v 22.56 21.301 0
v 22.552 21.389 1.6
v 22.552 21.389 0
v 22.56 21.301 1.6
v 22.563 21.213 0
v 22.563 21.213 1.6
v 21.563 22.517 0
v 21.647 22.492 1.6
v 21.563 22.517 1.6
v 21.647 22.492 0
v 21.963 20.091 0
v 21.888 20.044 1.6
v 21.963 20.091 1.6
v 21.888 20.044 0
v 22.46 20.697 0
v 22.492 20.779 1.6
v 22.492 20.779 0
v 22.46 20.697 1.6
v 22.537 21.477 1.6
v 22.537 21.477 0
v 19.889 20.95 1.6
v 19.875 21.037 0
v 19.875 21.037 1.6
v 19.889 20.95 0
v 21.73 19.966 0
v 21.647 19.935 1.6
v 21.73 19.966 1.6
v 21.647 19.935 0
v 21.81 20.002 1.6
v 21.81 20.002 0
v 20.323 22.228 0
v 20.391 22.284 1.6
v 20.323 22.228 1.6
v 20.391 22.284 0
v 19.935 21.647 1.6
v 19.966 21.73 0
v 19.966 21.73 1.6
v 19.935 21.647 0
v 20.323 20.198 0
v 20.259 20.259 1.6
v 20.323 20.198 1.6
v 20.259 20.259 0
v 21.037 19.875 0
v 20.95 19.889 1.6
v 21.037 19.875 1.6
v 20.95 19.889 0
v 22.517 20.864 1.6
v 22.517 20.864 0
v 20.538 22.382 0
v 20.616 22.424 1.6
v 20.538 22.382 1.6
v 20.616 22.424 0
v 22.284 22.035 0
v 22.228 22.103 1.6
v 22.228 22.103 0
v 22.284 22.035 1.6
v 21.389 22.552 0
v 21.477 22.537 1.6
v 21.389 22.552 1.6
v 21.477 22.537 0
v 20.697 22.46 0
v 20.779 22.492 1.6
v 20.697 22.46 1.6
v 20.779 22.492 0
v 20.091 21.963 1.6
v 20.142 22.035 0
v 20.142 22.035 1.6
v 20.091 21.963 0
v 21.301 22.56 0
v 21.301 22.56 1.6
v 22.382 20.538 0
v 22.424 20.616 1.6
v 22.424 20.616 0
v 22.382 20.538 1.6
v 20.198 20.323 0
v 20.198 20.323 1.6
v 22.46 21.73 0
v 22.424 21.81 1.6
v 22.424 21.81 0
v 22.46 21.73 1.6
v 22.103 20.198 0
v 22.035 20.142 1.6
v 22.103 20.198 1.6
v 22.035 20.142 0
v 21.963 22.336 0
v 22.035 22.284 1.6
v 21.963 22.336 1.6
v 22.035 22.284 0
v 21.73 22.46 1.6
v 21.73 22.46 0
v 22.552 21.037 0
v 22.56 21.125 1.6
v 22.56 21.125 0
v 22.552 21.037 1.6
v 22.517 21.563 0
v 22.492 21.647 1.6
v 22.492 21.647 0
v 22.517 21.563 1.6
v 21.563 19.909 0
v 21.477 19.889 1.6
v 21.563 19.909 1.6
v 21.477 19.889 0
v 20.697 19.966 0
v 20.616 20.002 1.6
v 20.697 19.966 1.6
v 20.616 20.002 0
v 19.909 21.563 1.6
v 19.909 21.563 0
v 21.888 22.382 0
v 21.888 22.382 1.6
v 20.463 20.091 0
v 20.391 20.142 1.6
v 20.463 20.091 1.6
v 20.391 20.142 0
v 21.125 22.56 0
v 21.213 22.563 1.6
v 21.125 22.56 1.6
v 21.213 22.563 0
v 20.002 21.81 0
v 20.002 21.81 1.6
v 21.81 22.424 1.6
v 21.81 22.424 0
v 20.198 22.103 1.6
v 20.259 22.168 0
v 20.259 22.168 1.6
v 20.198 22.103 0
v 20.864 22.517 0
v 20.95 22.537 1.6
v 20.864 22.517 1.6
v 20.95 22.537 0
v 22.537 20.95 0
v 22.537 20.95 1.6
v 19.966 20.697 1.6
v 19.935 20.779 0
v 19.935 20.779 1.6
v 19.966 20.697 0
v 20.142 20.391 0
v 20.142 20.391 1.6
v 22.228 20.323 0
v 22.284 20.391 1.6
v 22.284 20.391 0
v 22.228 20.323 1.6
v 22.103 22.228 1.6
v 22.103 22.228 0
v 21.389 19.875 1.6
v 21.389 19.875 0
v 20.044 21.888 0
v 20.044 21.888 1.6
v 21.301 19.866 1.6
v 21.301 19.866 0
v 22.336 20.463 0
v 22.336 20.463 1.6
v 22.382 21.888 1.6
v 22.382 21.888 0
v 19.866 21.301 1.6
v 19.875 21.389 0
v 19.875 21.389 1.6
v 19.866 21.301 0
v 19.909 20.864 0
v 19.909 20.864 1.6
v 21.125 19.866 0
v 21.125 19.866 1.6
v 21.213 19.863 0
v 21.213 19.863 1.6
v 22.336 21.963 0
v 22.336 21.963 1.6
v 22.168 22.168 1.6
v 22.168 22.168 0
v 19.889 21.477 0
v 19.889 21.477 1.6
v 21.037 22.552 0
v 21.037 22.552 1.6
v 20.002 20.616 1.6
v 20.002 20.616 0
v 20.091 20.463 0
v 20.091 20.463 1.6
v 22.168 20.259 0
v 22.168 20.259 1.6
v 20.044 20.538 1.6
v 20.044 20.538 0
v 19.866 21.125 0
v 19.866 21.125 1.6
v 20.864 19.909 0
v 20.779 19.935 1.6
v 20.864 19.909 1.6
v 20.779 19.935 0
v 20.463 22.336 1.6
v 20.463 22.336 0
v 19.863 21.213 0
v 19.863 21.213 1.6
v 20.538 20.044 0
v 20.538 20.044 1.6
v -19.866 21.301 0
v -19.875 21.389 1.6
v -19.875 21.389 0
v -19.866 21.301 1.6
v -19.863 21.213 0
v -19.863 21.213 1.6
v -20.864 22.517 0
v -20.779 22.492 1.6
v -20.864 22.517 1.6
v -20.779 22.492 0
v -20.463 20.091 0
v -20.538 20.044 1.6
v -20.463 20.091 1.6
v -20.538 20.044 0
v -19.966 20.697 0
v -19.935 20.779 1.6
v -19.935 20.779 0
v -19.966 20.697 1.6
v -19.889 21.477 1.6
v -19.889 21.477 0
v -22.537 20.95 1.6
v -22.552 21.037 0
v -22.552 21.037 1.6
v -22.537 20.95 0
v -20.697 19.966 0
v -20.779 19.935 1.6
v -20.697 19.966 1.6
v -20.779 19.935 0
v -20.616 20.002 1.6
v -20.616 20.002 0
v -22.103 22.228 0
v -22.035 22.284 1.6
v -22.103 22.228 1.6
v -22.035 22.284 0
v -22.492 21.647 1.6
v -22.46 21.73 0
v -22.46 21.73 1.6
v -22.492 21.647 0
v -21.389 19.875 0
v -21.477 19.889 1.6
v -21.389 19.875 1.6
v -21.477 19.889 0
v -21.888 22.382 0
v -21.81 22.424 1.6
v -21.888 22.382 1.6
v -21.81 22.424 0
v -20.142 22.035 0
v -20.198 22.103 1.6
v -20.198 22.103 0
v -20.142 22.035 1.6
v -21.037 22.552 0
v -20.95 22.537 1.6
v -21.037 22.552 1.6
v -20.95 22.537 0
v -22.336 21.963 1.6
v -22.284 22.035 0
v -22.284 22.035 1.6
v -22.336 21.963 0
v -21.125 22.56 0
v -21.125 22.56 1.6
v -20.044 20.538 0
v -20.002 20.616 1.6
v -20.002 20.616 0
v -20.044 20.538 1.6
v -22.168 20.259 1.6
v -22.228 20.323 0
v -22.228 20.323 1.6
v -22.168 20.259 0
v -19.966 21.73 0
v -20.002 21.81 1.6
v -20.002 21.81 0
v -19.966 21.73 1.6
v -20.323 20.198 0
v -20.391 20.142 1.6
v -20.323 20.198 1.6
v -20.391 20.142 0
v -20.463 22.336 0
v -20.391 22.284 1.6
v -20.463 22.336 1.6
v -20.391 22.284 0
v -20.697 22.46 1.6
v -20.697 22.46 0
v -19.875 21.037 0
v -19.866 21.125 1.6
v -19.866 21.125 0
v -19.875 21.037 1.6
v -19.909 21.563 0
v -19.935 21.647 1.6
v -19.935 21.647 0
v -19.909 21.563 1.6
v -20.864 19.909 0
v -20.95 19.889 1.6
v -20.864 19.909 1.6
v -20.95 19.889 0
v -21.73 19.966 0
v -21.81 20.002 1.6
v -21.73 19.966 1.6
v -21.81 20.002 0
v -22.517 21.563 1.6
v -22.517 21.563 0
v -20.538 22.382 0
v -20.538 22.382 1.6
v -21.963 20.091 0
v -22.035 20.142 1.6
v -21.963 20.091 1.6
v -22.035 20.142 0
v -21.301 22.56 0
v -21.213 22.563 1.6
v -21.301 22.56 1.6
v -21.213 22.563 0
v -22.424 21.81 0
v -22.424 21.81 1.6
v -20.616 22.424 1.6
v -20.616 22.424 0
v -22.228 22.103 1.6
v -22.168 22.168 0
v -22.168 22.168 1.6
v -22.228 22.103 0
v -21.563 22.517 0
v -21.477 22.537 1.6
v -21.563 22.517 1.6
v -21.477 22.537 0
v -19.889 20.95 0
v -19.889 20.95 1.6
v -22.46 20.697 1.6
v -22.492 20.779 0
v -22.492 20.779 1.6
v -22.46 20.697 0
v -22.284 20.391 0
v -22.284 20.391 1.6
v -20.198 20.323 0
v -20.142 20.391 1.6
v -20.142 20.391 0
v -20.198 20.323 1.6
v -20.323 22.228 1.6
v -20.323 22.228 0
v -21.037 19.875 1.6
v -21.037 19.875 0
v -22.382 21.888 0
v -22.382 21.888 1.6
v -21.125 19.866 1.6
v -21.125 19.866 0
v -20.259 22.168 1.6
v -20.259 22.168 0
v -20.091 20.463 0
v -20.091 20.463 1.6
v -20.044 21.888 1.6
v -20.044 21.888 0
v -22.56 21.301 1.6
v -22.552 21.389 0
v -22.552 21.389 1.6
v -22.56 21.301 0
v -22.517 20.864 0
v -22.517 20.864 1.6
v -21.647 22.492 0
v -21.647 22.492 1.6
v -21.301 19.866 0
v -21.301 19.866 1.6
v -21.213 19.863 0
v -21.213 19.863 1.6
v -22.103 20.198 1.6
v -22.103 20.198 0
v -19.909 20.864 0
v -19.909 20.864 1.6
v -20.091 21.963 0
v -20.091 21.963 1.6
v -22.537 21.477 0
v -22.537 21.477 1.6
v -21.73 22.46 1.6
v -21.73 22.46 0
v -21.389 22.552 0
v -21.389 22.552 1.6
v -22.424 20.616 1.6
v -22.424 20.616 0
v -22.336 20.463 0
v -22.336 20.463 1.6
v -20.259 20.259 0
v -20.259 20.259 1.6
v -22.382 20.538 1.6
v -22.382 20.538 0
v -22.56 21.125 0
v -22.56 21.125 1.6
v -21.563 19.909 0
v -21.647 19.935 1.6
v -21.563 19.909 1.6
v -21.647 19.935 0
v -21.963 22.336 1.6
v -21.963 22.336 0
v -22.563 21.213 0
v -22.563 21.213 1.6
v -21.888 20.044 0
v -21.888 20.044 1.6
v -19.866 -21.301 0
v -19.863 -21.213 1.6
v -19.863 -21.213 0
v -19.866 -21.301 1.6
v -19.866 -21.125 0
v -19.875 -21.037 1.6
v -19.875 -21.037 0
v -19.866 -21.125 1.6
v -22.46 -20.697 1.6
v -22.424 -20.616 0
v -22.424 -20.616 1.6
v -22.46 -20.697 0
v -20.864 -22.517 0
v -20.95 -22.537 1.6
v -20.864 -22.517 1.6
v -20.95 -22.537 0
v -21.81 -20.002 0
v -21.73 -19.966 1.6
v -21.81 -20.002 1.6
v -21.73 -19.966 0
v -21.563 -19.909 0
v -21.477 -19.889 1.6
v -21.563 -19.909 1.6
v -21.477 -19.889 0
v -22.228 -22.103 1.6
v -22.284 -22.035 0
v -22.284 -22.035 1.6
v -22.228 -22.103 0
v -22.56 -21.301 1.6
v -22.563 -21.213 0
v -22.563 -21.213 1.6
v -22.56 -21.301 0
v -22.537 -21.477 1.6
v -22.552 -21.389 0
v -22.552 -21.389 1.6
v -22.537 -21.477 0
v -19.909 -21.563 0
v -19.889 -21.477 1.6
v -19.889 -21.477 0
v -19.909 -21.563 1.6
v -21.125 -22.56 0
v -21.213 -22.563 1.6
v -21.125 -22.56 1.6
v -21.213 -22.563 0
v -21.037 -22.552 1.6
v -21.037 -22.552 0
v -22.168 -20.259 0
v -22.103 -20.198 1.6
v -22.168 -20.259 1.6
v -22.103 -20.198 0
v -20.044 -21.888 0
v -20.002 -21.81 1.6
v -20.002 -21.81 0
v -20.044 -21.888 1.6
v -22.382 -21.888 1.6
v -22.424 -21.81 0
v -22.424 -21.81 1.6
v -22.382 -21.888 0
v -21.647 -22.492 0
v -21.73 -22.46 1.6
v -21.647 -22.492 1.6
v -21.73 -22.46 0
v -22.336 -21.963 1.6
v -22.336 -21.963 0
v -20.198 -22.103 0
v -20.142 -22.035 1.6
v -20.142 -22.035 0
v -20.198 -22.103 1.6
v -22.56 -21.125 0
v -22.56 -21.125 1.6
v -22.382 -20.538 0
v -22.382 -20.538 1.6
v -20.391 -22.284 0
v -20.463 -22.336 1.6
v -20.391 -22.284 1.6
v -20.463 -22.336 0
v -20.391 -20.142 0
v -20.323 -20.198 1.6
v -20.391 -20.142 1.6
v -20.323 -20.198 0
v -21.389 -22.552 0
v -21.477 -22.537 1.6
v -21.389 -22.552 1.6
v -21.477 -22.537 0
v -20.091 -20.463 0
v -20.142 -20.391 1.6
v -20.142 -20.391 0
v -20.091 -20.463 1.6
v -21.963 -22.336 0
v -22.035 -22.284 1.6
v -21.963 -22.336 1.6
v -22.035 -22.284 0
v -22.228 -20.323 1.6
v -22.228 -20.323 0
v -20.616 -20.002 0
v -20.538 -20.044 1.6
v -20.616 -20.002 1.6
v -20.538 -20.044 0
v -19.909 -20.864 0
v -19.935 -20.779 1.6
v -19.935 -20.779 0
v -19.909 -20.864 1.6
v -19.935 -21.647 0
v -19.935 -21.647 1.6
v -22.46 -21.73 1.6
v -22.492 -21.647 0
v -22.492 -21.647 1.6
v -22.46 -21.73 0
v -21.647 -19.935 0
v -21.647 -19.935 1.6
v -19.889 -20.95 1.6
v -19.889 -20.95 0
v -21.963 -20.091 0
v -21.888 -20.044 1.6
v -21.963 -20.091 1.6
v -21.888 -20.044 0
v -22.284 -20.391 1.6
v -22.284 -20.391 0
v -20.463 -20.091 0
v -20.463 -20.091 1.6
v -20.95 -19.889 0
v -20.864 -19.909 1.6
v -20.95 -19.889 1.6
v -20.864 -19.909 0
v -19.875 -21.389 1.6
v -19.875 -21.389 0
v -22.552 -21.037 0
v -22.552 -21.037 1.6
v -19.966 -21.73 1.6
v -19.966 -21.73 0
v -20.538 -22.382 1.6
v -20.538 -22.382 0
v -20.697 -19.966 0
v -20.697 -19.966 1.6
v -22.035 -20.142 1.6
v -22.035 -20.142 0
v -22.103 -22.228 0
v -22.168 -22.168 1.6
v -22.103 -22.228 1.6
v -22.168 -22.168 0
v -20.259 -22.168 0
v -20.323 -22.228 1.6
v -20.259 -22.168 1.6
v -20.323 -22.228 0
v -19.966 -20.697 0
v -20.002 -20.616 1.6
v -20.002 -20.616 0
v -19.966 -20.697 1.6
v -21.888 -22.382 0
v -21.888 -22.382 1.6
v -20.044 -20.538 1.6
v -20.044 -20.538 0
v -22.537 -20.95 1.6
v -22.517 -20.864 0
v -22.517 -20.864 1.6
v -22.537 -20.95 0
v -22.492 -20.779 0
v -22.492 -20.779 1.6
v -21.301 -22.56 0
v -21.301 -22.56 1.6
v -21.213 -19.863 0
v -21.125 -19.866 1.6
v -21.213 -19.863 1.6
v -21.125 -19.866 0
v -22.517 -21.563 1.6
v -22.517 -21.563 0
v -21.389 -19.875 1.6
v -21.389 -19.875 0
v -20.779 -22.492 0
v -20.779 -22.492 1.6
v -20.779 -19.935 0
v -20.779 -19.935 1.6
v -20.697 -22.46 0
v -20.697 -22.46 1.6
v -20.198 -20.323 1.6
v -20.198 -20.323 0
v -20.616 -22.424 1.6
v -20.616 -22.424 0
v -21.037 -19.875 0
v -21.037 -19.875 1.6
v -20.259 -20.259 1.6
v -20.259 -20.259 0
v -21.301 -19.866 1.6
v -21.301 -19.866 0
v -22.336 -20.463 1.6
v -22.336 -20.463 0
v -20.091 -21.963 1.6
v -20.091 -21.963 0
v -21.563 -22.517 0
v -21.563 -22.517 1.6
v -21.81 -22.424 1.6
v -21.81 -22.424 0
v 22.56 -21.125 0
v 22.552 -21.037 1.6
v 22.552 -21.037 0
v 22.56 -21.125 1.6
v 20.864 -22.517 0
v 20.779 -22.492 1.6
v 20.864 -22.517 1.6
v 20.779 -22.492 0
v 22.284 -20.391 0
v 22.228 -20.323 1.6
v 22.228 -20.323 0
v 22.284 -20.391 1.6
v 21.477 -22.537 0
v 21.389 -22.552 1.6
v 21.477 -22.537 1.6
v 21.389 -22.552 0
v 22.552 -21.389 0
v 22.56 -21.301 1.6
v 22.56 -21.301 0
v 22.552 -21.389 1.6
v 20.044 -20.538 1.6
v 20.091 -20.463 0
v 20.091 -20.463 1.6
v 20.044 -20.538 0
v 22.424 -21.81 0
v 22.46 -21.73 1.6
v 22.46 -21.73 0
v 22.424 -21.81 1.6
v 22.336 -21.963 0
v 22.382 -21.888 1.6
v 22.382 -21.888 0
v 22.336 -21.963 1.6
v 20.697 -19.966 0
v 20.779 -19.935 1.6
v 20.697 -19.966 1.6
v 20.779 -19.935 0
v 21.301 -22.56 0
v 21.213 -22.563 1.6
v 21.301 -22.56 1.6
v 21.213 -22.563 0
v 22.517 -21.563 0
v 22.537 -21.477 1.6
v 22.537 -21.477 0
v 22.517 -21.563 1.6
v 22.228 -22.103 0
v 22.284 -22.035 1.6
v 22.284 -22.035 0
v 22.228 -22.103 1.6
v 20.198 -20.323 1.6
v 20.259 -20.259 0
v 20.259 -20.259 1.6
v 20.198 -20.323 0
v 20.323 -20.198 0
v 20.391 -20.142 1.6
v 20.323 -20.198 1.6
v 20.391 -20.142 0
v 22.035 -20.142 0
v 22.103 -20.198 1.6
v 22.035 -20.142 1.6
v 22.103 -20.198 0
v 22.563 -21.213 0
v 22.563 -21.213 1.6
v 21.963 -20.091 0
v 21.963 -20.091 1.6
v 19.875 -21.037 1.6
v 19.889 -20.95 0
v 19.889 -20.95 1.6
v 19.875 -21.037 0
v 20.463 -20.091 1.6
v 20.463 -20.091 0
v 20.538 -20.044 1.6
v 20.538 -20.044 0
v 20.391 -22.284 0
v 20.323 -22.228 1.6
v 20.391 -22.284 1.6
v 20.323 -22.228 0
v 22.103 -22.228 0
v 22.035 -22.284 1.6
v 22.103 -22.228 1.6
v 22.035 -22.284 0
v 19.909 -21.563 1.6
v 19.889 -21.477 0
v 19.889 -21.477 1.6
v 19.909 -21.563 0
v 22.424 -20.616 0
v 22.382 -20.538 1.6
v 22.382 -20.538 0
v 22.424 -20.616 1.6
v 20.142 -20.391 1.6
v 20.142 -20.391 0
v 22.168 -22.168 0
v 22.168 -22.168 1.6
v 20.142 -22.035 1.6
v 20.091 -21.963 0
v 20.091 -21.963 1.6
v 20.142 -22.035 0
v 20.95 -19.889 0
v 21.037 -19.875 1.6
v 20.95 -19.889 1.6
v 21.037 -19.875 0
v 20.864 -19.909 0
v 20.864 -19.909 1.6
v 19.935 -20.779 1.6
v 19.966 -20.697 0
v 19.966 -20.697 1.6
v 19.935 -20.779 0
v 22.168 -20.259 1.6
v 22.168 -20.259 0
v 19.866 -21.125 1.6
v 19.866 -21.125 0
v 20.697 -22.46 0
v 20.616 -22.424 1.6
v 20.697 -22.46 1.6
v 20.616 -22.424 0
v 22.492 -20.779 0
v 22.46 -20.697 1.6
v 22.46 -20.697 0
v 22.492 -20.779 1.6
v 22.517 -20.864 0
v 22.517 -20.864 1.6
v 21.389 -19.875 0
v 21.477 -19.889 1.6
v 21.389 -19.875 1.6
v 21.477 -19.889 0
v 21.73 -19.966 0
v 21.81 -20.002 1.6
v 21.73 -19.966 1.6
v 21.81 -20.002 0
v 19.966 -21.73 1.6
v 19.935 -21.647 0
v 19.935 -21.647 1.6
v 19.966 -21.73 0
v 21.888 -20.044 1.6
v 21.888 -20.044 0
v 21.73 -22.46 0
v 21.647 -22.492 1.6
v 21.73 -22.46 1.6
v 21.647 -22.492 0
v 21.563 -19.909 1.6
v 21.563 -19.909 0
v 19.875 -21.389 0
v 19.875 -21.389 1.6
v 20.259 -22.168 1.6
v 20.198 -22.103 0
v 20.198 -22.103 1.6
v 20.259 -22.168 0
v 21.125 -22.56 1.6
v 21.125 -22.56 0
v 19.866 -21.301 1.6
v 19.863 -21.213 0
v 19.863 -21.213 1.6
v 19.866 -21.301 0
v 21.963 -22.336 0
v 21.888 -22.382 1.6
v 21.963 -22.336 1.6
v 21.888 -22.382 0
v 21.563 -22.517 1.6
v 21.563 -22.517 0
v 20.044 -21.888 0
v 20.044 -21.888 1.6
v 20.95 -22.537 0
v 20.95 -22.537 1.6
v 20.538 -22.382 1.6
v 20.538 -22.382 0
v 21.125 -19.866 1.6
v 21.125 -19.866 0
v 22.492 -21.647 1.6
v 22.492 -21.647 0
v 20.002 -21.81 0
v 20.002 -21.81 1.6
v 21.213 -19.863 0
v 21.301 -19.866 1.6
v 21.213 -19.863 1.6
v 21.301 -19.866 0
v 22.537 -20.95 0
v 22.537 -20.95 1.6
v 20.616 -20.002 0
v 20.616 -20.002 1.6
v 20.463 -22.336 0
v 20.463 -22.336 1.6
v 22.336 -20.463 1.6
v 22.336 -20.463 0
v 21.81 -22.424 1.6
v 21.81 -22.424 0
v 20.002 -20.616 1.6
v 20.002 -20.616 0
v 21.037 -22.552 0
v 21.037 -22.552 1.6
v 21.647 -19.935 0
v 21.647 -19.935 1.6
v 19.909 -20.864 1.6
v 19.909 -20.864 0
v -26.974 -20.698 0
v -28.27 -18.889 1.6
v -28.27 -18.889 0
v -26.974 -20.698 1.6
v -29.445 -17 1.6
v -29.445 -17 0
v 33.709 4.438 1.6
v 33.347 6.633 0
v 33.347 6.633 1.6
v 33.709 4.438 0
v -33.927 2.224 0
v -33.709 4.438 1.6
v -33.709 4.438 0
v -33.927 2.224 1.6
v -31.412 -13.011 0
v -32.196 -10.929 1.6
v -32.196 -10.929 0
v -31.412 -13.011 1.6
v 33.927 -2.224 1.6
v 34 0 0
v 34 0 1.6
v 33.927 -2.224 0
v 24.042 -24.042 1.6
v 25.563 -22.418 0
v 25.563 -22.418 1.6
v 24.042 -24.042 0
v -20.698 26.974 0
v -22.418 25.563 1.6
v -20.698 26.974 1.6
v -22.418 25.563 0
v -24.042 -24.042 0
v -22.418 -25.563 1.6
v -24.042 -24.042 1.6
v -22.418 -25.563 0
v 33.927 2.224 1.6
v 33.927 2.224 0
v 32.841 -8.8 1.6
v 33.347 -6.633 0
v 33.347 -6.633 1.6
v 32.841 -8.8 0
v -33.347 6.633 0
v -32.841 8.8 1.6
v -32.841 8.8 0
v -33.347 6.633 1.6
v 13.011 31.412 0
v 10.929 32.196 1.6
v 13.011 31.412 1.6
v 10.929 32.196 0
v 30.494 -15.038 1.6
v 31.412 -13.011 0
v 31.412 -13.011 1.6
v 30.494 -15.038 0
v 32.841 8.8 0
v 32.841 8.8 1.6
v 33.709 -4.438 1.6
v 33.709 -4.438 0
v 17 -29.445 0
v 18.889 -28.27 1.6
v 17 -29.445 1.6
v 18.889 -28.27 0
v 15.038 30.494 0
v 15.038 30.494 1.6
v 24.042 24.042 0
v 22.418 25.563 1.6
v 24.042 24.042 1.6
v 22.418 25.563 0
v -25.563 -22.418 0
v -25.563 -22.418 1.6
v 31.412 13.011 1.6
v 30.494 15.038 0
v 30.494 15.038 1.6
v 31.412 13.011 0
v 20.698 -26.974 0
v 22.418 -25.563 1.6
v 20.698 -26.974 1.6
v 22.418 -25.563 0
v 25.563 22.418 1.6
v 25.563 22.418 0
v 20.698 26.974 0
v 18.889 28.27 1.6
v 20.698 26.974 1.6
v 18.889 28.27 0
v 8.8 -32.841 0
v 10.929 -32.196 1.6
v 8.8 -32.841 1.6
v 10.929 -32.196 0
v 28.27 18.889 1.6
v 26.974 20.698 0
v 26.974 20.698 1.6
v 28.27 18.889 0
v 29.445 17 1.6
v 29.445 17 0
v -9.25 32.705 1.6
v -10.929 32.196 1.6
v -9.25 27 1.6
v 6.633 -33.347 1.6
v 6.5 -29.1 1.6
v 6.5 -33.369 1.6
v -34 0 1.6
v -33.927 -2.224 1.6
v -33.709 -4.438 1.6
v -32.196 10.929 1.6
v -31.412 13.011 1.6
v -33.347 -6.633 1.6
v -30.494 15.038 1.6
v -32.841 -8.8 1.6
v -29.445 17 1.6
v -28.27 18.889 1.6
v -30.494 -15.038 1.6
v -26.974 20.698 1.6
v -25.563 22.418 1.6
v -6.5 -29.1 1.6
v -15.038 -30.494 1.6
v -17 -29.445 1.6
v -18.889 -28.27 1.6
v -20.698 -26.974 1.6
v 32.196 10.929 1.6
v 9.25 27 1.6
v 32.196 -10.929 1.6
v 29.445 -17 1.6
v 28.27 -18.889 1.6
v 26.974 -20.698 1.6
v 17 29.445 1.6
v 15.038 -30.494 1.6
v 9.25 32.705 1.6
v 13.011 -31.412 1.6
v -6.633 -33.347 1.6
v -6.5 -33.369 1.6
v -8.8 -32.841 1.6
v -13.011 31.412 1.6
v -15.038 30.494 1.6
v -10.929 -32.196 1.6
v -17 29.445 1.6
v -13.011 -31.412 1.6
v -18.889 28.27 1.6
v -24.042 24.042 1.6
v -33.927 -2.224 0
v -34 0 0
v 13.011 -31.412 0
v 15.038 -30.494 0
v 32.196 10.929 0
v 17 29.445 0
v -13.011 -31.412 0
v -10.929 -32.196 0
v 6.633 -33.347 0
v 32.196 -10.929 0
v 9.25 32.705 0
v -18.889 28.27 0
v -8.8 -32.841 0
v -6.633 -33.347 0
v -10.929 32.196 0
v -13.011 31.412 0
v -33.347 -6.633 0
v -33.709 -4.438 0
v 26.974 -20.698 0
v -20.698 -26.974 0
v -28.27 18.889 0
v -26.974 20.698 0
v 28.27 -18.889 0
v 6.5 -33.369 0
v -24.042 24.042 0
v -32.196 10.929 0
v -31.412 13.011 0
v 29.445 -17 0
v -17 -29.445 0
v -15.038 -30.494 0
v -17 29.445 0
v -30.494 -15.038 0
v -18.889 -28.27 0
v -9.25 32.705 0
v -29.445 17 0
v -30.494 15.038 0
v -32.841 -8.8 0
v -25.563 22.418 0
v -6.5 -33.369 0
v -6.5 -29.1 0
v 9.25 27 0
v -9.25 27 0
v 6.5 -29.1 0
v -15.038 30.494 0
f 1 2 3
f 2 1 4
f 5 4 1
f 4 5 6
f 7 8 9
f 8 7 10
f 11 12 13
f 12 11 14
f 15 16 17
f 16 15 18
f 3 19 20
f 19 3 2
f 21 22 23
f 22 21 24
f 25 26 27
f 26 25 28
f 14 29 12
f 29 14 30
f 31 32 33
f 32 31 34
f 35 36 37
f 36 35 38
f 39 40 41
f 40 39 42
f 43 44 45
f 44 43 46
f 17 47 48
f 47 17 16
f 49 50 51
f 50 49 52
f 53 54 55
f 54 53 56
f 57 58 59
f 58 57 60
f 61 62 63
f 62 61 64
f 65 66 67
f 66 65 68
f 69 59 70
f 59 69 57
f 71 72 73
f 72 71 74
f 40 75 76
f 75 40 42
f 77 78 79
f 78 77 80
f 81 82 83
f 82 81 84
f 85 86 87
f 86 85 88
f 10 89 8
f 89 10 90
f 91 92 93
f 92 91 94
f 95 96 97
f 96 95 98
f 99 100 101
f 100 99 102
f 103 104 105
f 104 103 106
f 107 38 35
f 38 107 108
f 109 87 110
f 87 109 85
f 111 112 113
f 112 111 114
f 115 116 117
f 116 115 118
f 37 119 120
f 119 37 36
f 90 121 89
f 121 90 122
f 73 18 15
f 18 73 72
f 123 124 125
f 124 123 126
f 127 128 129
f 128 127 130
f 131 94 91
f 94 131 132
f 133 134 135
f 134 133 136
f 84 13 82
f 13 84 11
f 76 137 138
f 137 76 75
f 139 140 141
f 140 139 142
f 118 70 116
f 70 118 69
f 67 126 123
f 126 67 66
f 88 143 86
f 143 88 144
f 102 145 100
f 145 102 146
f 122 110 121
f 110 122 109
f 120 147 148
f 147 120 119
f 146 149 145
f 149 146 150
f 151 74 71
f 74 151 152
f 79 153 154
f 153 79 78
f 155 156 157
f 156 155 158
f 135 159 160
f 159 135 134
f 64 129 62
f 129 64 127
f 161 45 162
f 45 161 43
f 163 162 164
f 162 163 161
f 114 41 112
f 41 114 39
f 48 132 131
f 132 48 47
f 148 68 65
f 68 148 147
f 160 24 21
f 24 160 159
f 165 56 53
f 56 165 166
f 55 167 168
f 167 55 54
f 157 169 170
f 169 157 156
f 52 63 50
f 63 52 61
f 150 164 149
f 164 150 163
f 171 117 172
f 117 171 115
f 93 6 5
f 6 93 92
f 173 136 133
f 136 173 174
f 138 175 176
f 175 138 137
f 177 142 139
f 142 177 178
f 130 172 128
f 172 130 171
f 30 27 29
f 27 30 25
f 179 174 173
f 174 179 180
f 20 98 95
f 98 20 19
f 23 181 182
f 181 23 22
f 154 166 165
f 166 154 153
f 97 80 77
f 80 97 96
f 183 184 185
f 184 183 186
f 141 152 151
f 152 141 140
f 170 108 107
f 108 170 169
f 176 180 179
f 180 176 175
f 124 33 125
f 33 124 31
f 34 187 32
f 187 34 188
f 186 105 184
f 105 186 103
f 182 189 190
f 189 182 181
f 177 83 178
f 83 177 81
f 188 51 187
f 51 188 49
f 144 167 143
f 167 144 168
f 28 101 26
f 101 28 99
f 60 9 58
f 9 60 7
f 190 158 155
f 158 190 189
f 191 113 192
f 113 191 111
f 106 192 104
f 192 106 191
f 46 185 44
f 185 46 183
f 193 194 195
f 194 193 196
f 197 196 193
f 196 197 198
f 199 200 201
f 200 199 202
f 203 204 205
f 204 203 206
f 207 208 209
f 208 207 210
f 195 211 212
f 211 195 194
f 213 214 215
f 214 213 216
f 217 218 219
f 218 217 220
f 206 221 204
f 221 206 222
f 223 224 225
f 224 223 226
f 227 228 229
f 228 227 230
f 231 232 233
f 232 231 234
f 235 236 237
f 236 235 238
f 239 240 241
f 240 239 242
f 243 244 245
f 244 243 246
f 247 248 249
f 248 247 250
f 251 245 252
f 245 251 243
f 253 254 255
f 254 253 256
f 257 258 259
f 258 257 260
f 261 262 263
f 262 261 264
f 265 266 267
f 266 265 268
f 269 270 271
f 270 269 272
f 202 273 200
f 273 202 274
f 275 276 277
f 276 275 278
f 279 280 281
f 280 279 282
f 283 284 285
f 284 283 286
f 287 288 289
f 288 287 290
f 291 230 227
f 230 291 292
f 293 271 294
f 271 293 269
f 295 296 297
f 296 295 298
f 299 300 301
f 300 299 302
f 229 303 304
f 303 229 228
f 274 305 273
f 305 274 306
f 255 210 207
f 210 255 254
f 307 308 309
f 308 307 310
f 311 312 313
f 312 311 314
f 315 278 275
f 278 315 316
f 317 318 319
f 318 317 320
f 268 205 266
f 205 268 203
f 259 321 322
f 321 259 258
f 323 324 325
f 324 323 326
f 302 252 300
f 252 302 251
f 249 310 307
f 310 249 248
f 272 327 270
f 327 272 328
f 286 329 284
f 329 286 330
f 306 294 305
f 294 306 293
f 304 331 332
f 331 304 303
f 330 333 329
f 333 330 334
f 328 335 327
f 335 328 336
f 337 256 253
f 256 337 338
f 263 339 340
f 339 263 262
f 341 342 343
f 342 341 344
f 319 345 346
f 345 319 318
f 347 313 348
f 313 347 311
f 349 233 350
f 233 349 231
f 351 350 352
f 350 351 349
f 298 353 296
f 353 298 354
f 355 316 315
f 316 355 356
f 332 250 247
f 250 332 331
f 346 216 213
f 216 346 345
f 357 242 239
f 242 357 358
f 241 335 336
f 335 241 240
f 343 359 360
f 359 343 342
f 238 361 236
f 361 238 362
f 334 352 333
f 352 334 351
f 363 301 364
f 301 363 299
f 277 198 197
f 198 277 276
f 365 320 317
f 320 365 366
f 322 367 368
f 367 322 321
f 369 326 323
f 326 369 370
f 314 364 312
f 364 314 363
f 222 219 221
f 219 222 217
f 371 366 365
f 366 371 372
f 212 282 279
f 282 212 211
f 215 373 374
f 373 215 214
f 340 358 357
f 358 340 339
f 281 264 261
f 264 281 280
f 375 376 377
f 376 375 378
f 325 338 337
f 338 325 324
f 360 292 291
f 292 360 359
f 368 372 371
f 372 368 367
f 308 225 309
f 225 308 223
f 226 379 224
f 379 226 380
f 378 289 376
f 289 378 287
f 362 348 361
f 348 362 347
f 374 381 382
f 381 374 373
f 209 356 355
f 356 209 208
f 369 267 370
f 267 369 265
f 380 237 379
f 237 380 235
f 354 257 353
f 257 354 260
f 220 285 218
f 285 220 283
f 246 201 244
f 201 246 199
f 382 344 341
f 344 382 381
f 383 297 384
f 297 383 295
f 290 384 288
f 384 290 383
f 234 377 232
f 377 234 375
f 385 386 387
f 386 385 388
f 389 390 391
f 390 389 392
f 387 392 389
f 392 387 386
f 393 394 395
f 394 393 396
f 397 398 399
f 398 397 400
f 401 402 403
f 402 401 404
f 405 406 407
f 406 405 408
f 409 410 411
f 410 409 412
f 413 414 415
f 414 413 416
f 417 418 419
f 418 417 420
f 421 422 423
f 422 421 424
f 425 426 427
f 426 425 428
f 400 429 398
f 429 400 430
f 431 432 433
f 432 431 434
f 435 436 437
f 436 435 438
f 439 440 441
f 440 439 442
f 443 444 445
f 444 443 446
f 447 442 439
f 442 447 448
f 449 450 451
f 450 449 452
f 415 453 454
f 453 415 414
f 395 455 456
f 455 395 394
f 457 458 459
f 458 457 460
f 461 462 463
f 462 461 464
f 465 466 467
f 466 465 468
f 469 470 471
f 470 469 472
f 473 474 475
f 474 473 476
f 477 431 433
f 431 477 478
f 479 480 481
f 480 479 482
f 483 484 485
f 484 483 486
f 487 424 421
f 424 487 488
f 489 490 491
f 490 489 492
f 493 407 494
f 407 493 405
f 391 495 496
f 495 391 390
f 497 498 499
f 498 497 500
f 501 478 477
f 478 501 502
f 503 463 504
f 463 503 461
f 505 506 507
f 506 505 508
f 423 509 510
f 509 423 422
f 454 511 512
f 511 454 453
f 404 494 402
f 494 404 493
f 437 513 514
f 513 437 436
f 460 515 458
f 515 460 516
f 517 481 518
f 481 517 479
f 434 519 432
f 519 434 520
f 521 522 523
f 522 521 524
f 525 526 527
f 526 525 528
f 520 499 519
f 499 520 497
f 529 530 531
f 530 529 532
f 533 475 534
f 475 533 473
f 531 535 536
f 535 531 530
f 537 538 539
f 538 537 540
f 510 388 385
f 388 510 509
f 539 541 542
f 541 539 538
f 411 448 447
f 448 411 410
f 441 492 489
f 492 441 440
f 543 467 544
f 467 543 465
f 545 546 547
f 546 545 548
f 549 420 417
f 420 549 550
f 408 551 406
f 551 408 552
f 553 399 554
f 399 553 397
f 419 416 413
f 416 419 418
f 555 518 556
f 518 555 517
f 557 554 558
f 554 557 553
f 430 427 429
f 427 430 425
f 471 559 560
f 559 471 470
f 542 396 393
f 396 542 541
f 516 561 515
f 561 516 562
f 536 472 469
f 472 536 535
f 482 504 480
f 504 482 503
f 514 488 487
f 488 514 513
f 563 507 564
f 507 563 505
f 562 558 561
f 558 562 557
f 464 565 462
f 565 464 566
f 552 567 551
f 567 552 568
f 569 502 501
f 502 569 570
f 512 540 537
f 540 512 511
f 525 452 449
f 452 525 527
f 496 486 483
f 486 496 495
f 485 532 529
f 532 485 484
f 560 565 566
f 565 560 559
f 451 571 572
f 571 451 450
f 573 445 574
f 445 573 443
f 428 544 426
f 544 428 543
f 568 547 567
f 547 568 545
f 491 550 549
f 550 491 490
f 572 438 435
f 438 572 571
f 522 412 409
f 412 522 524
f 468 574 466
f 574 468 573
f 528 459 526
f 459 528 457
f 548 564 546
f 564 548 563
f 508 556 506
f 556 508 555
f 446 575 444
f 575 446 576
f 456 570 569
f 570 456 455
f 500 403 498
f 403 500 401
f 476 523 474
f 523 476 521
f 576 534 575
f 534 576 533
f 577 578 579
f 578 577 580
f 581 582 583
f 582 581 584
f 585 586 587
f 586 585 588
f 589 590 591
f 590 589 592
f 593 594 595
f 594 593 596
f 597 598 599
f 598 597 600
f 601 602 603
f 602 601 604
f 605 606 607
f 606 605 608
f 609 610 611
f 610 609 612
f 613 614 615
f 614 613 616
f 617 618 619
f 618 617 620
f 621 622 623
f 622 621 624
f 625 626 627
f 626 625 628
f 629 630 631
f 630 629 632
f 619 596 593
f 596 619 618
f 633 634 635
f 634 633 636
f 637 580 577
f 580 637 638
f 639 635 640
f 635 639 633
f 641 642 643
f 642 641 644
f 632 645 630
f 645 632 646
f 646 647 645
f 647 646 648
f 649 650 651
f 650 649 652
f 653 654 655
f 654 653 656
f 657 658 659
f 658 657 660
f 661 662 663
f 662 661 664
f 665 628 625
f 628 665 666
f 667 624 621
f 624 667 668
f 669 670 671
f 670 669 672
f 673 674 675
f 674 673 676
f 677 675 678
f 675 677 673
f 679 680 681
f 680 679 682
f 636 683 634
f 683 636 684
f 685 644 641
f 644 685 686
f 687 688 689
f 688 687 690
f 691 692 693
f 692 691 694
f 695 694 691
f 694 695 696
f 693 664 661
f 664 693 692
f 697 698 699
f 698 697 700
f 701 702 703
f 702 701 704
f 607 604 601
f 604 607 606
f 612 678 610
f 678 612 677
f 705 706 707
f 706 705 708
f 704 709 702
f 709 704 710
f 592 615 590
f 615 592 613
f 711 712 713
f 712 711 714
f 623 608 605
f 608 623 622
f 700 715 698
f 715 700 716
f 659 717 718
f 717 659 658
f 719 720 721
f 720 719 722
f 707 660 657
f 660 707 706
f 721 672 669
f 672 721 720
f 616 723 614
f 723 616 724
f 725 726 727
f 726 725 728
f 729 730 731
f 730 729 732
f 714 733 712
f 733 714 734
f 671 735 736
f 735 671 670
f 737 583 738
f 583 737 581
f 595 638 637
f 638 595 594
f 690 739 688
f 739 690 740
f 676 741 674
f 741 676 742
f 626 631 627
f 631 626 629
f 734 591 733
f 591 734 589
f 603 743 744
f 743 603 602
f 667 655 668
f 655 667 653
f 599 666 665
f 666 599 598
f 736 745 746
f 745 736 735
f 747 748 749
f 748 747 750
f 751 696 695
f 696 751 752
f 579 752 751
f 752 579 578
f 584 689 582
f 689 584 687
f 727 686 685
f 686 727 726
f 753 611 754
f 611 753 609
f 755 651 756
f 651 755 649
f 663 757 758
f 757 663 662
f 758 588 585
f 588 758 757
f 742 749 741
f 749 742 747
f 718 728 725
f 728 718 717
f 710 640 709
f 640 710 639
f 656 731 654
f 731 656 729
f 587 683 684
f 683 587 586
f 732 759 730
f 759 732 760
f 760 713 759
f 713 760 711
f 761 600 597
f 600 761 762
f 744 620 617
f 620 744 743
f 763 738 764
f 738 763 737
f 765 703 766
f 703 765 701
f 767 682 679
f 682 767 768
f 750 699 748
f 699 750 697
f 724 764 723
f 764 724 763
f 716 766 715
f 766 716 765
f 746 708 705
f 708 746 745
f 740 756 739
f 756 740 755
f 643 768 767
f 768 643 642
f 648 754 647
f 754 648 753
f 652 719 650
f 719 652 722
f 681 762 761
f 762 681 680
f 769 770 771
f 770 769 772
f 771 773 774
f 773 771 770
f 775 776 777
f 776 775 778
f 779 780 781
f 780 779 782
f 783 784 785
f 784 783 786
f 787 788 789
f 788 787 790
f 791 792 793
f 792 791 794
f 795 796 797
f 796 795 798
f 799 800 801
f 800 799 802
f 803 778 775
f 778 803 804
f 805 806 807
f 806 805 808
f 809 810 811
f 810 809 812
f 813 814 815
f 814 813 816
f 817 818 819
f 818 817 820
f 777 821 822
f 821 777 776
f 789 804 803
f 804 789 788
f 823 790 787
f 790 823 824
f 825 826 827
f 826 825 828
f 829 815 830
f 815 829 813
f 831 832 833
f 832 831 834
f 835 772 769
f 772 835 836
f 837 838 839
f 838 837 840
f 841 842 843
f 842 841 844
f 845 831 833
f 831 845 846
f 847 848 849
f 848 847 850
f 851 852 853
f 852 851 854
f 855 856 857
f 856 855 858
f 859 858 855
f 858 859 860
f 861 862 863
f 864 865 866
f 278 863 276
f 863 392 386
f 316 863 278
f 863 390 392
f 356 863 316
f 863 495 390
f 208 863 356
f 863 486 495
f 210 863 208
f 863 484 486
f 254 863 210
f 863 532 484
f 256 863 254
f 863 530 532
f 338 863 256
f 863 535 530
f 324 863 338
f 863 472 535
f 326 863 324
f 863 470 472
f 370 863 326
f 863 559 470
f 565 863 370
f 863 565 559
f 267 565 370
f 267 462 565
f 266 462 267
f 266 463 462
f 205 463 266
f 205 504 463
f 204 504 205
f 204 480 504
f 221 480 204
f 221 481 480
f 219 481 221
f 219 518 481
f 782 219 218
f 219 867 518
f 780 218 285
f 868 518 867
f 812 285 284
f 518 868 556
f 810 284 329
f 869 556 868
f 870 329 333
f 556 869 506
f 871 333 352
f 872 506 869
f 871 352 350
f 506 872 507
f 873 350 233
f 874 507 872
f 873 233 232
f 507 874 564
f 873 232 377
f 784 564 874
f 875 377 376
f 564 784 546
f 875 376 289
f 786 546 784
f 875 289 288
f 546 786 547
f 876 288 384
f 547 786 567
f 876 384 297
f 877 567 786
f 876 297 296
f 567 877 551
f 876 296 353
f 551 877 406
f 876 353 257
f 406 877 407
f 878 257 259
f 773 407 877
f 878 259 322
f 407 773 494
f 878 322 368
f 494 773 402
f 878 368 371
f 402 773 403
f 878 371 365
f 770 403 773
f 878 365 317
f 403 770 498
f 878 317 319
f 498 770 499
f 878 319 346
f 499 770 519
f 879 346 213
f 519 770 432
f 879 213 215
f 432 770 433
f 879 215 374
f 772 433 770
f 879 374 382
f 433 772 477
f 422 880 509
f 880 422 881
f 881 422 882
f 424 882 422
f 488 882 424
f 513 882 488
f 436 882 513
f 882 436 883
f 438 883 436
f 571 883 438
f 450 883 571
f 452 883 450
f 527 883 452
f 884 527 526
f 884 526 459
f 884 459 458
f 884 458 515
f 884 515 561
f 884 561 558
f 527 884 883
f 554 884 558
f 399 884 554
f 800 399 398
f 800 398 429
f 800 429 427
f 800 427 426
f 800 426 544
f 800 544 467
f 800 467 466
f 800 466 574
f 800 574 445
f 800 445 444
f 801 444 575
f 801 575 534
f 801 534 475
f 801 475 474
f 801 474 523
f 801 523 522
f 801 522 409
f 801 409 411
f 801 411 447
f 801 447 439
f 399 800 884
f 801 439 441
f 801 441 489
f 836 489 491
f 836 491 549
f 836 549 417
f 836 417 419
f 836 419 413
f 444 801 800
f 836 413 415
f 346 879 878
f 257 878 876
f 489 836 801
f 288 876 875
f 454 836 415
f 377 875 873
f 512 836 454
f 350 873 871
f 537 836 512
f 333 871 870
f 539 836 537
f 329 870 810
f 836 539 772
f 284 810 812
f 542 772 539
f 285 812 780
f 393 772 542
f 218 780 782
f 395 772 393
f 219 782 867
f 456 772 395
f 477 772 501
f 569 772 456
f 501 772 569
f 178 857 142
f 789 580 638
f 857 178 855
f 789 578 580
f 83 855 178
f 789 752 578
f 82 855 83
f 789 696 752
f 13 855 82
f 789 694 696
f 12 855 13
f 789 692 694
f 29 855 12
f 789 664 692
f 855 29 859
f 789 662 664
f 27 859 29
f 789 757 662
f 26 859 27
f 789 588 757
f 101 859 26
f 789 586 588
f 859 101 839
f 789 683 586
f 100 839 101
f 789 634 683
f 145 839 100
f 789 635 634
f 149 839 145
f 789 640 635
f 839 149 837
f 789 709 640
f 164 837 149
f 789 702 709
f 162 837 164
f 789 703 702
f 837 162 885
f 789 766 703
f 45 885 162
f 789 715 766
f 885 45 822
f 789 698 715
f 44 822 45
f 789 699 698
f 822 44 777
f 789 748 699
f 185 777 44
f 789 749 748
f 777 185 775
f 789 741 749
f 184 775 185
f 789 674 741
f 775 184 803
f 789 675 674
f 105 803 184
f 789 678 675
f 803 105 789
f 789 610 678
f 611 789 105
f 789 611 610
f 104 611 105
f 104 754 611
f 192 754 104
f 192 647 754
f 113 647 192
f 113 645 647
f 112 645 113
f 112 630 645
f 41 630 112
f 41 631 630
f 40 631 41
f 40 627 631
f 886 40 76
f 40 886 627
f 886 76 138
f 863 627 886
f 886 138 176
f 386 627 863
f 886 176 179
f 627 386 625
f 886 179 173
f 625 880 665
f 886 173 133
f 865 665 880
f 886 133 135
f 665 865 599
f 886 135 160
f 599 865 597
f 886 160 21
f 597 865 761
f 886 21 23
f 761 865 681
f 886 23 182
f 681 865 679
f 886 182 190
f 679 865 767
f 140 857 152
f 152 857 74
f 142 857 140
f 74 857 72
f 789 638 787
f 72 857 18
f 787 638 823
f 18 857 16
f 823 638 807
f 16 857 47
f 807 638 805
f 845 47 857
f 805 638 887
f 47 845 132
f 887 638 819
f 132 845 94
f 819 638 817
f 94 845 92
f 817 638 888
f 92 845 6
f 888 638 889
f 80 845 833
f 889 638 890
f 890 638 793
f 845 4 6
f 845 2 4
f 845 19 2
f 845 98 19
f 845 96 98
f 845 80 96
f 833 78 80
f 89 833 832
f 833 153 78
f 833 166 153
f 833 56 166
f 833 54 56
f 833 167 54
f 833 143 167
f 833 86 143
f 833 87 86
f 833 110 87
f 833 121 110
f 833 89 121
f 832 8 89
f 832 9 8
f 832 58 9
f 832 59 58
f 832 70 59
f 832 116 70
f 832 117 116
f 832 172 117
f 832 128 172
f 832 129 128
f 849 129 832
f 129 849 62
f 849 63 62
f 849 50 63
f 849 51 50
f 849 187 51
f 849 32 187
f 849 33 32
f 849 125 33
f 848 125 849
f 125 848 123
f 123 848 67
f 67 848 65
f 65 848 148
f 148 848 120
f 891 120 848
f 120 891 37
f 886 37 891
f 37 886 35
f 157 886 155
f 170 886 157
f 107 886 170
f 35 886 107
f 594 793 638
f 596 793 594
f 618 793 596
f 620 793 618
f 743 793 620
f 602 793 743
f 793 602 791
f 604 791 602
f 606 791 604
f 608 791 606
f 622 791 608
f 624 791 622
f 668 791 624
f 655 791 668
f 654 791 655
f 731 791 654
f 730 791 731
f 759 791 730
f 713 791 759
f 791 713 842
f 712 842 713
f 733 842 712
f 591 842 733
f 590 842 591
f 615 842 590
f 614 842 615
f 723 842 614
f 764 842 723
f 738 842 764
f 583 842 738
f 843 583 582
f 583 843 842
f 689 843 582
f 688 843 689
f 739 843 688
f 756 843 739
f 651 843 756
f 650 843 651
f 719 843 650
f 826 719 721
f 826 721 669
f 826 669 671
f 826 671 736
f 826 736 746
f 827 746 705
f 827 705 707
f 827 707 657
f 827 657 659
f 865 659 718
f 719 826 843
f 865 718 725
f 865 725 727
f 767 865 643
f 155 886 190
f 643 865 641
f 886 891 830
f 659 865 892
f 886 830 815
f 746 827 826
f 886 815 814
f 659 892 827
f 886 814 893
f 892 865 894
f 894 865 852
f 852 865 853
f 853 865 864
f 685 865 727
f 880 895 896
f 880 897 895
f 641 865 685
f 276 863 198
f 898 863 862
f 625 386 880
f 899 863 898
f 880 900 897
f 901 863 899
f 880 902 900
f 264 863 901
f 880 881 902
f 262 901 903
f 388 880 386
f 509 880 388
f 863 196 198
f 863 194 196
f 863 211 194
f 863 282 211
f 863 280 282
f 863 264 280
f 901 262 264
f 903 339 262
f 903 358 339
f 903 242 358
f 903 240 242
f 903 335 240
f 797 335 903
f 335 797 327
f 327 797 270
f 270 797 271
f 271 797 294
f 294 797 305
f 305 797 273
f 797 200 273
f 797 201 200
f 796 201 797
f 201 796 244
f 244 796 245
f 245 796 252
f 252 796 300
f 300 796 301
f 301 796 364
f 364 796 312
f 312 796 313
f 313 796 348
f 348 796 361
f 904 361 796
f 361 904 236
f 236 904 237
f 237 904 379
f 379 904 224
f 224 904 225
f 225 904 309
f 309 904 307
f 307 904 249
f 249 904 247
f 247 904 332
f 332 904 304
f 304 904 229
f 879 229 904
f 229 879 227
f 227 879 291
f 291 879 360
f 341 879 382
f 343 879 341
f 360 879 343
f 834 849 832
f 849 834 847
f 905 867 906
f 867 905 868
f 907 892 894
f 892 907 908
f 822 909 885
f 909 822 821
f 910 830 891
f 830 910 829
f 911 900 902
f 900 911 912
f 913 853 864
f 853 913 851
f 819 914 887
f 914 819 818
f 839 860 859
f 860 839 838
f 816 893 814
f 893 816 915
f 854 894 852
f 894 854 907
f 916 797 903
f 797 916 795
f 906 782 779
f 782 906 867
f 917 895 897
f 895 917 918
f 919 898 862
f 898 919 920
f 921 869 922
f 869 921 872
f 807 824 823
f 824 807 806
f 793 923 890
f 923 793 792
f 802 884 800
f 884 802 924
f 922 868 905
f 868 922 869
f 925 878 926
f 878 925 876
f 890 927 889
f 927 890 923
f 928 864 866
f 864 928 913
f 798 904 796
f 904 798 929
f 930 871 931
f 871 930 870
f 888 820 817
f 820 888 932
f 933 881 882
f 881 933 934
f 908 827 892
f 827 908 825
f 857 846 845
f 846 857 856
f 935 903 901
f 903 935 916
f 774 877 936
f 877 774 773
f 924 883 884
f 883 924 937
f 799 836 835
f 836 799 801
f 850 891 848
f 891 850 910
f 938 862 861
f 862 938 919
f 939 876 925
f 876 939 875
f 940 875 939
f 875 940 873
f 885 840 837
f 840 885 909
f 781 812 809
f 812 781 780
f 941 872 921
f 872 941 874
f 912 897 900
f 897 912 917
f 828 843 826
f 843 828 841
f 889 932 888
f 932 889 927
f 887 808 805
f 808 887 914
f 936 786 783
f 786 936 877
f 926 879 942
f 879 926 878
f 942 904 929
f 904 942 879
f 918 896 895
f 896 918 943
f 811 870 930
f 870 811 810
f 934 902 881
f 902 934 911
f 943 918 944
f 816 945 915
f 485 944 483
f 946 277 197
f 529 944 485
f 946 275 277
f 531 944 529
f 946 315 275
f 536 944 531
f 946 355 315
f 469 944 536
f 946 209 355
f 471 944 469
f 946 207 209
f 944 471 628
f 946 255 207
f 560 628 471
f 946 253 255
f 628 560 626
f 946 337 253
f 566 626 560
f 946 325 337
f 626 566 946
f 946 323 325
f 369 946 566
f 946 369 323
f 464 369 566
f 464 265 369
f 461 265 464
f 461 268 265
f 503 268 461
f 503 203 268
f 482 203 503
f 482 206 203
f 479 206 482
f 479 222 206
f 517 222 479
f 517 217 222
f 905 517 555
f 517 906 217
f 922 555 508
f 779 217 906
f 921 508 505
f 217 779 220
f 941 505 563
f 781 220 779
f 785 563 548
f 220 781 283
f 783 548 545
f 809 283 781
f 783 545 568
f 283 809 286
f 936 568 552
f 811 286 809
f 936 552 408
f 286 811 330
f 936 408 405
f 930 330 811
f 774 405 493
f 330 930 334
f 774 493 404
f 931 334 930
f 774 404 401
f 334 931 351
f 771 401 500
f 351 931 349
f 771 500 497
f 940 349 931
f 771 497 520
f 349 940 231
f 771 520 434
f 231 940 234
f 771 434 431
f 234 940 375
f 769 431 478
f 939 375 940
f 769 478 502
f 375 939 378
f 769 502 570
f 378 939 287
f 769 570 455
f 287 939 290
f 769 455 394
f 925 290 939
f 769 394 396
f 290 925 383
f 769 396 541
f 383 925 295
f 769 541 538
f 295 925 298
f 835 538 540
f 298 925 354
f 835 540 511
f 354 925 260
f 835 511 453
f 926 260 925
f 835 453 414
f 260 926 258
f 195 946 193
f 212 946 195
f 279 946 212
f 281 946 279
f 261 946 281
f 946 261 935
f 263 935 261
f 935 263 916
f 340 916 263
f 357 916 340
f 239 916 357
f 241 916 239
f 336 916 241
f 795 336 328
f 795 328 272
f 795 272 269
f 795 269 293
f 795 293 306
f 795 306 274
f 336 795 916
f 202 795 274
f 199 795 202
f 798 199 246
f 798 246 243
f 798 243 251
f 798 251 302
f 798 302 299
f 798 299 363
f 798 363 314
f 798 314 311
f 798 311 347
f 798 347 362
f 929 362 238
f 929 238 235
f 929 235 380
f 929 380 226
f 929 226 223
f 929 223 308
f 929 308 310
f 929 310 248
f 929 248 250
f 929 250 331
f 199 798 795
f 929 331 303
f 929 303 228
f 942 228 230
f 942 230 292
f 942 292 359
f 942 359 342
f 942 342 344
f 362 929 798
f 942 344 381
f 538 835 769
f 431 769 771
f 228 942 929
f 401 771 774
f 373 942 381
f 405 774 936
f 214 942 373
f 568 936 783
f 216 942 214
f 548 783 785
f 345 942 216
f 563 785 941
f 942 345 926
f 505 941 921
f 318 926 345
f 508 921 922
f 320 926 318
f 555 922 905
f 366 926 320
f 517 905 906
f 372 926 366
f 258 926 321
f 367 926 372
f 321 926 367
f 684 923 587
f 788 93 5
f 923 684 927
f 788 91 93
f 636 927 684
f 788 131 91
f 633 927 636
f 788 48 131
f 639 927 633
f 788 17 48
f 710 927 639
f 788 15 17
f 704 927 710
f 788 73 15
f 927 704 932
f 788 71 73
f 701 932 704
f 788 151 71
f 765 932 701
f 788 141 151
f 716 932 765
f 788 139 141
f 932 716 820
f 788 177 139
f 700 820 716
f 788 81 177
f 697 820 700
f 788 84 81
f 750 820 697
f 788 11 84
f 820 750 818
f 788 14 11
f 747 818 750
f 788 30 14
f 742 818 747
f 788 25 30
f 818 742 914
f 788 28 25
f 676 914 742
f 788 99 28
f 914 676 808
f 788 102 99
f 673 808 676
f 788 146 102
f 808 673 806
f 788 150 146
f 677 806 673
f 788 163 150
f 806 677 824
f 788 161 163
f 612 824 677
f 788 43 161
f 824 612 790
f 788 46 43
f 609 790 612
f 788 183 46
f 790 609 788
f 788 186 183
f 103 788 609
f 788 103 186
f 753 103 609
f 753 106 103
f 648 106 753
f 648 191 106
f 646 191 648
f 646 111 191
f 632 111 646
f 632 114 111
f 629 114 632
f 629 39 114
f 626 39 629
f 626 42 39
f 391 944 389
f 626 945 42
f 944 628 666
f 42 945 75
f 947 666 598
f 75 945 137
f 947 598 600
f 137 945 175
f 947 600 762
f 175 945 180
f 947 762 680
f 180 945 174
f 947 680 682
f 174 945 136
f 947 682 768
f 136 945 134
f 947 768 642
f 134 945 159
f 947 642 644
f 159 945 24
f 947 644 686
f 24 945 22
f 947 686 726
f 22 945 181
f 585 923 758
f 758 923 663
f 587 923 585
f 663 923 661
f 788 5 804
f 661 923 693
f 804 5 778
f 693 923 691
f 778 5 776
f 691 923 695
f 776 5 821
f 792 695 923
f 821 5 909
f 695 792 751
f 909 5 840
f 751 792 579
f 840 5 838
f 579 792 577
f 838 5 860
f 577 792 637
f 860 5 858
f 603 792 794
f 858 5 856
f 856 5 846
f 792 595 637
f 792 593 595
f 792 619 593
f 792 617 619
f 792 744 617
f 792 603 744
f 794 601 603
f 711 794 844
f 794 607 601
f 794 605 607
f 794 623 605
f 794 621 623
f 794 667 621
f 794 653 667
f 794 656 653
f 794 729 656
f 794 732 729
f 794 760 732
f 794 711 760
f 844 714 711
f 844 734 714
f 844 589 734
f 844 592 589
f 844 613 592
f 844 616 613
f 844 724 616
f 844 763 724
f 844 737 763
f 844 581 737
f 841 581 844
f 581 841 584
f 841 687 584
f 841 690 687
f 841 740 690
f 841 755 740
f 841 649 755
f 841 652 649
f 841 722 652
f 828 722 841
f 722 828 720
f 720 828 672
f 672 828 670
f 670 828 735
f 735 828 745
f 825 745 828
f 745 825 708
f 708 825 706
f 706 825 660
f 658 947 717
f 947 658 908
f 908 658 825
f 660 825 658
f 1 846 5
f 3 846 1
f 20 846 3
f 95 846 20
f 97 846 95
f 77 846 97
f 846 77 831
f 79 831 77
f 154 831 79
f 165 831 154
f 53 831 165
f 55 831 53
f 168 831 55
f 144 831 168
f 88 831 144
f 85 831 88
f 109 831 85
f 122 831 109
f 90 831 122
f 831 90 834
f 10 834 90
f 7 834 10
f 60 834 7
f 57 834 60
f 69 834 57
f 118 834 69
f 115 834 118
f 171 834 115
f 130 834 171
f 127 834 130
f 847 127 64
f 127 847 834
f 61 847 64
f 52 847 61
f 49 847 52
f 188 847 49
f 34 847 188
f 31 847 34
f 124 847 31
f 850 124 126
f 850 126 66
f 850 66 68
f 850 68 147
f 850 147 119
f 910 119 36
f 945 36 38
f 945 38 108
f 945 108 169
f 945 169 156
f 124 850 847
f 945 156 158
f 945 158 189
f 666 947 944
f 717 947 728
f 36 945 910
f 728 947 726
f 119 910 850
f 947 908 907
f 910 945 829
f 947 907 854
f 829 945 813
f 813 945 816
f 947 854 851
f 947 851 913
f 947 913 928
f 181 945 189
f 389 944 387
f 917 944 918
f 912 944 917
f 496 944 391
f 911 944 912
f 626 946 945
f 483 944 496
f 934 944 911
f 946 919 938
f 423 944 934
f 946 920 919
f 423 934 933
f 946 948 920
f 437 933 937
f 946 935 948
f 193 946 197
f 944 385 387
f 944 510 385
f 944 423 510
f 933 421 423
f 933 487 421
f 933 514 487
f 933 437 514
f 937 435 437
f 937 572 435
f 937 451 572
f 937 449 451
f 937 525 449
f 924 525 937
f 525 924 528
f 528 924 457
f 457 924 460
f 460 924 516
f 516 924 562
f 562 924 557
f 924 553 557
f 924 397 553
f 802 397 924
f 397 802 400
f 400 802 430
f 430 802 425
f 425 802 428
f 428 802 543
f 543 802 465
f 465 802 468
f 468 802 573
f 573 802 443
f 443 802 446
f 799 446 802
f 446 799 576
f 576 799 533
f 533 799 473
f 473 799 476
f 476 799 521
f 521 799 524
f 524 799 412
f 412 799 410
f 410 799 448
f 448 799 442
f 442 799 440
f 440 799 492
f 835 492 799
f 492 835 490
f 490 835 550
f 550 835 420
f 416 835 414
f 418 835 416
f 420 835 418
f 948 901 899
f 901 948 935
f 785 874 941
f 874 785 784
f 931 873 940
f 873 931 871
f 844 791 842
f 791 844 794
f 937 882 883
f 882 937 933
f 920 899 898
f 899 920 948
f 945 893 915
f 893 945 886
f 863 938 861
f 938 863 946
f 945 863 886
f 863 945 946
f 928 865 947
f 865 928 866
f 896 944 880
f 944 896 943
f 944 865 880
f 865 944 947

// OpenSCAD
// ESP32 Artificial Horizon — electronics, control and rear-service hardware
// Supplementary/non-primary flight-development instrument
// Units: mm
// Custom ESP32-S3-WROOM-1-N16R2 PCB now mounts directly to rear-cover standoffs.
// Verify all purchased hardware and fabricated PCB dimensions before final printing.

$fn = 96;

// -----------------------------
// Shared enclosure dimensions
// -----------------------------
cover_t         = 3.0;
rear_lip_h      = 3.0;
body_od         = 79.60;
wall            = 3.0;
rear_open_d     = body_od - 2*wall;
cover_clearance = 0.35;
cover_spigot_d  = rear_open_d - 2*cover_clearance;
cover_flange_d  = body_od - 0.8;
rear_screw_circle_d = 66.0;
rear_screw_d    = 3.2;
usb_slot_w      = 13.0;
usb_slot_h      = 7.0;

// -----------------------------
// Front bezel + compact encoder
// -----------------------------
bezel_od             = 70.0;
bezel_id             = 55.0;
bezel_t              = 2.5;
bezel_spigot_h       = 1.5;
bezel_spigot_d       = 62.70;
bezel_screw_circle_d = 67.0;
bezel_screw_d        = 2.2;

encoder_pod_x        = 14.0;
encoder_pod_y        = 14.0;
encoder_pod_depth    = 9.0;
encoder_pod_center_y = -37.0;
encoder_panel_hole_d = 7.2;
encoder_body_x       = 11.5;
encoder_body_y       = 11.5;
encoder_body_depth   = 6.5;

// -----------------------------
// Custom carrier PCB mechanical target
// -----------------------------
// Revision-A target is a 68 mm circular, 1.6 mm PCB mounted directly to the
// rear-cover standoffs. The printed gauge below is for fit/drill validation only.
pcb_d = 68.0;
pcb_t = 1.6;
pcb_mount_pcd = 60.0;
pcb_mount_hole_d = 2.7; // M2.5 clearance

// ESP32-S3-WROOM-1 module reference envelope: 18.0 x 25.5 mm.
// The integrated antenna occupies the end of the module and must be kept clear.
module_x = 18.0;
module_y = 25.5;
module_antenna_y = 6.0;
module_center_y = pcb_d/2 - module_y/2 + 0.5;

// Gauge uses a rectangular opening under the antenna end to represent the
// intended RF keepout/cutout. Final PCB geometry must follow Espressif guidance.
antenna_keepout_x = 18.5;
antenna_keepout_y = 7.0;

// -----------------------------
// Rear cover internal standoffs
// -----------------------------
electronics_standoff_pcd = pcb_mount_pcd;
electronics_standoff_d   = 6.0;
electronics_standoff_h   = 10.0;
electronics_standoff_pilot_d = 2.0; // M2.5 insert/tap pilot

// -----------------------------
// USB-C cable strain relief
// -----------------------------
usb_clamp_center_y = -31.0;
usb_clamp_hole_pitch = 16.0;
usb_clamp_hole_d = 3.2;
usb_clamp_x = 22.0;
usb_clamp_y = 12.0;
usb_clamp_z = 4.0;
usb_cable_d = 5.0;

module front_bezel_with_encoder() {
    difference() {
        union() {
            difference() {
                cylinder(d=bezel_od, h=bezel_t);
                translate([0,0,-0.1]) cylinder(d=bezel_id, h=bezel_t+0.2);
            }
            translate([0,0,bezel_t])
                difference() {
                    cylinder(d=bezel_spigot_d, h=bezel_spigot_h);
                    translate([0,0,-0.1]) cylinder(d=bezel_id, h=bezel_spigot_h+0.2);
                }
            translate([-encoder_pod_x/2, encoder_pod_center_y-encoder_pod_y/2, 0])
                cube([encoder_pod_x, encoder_pod_y, encoder_pod_depth]);
        }

        for (a=[0,90,180,270]) {
            x=(bezel_screw_circle_d/2)*cos(a);
            y=(bezel_screw_circle_d/2)*sin(a);
            translate([x,y,-0.1]) cylinder(d=bezel_screw_d, h=bezel_t+bezel_spigot_h+0.3);
        }

        translate([-encoder_body_x/2, encoder_pod_center_y-encoder_body_y/2, -0.1])
            cube([encoder_body_x, encoder_body_y, encoder_body_depth+0.1]);

        translate([0,encoder_pod_center_y,encoder_body_depth-0.05])
            cylinder(d=encoder_panel_hole_d, h=encoder_pod_depth-encoder_body_depth+0.2);
    }
}

module pcb_fit_gauge() {
    difference() {
        cylinder(d=pcb_d, h=pcb_t);

        // Four M2.5-class mounting holes on the same 60 mm PCD as the rear cover.
        for (a=[45,135,225,315]) {
            x=(pcb_mount_pcd/2)*cos(a);
            y=(pcb_mount_pcd/2)*sin(a);
            translate([x,y,-0.1]) cylinder(d=pcb_mount_hole_d,h=pcb_t+0.2);
        }

        // RF antenna keepout/cutout at 12 o'clock.
        translate([-antenna_keepout_x/2, pcb_d/2-antenna_keepout_y, -0.1])
            cube([antenna_keepout_x, antenna_keepout_y+0.2, pcb_t+0.2]);

        // Small USB alignment notch at 6 o'clock for rear-cover slot checks.
        translate([-usb_slot_w/2,-pcb_d/2-0.1,-0.1])
            cube([usb_slot_w,5.0,pcb_t+0.2]);
    }
}

module rear_cover_service() {
    difference() {
        union() {
            cylinder(d=cover_flange_d, h=cover_t);
            translate([0,0,cover_t]) cylinder(d=cover_spigot_d, h=rear_lip_h);

            for (a=[45,135,225,315]) {
                x=(electronics_standoff_pcd/2)*cos(a);
                y=(electronics_standoff_pcd/2)*sin(a);
                translate([x,y,cover_t+rear_lip_h])
                    difference() {
                        cylinder(d=electronics_standoff_d,h=electronics_standoff_h);
                        cylinder(d=electronics_standoff_pilot_d,h=electronics_standoff_h+0.2);
                    }
            }
        }

        for (a=[45,135,225,315]) {
            x=(rear_screw_circle_d/2)*cos(a);
            y=(rear_screw_circle_d/2)*sin(a);
            translate([x,y,-0.1]) cylinder(d=rear_screw_d,h=cover_t+rear_lip_h+0.3);
        }

        translate([-usb_slot_w/2,-cover_flange_d/2-0.1,0.8])
            cube([usb_slot_w,usb_slot_h+2,cover_t+rear_lip_h]);

        for (x=[-usb_clamp_hole_pitch/2,usb_clamp_hole_pitch/2])
            translate([x,usb_clamp_center_y,-0.1])
                cylinder(d=usb_clamp_hole_d,h=cover_t+rear_lip_h+0.3);
    }
}

module usb_strain_relief_clamp() {
    difference() {
        translate([-usb_clamp_x/2,-usb_clamp_y/2,0])
            cube([usb_clamp_x,usb_clamp_y,usb_clamp_z]);

        for (x=[-usb_clamp_hole_pitch/2,usb_clamp_hole_pitch/2])
            translate([x,0,-0.1]) cylinder(d=usb_clamp_hole_d,h=usb_clamp_z+0.2);

        translate([0,0,0]) rotate([90,0,0])
            cylinder(d=usb_cable_d,h=usb_clamp_y+0.4,center=true);
    }
}

// FRONT_BEZEL_CONTROL, PCB_FIT_GAUGE, REAR_COVER_SERVICE, USB_CLAMP
part = "PCB_FIT_GAUGE";
if (part == "FRONT_BEZEL_CONTROL") front_bezel_with_encoder();
if (part == "PCB_FIT_GAUGE") pcb_fit_gauge();
if (part == "REAR_COVER_SERVICE") rear_cover_service();
if (part == "USB_CLAMP") usb_strain_relief_clamp();
